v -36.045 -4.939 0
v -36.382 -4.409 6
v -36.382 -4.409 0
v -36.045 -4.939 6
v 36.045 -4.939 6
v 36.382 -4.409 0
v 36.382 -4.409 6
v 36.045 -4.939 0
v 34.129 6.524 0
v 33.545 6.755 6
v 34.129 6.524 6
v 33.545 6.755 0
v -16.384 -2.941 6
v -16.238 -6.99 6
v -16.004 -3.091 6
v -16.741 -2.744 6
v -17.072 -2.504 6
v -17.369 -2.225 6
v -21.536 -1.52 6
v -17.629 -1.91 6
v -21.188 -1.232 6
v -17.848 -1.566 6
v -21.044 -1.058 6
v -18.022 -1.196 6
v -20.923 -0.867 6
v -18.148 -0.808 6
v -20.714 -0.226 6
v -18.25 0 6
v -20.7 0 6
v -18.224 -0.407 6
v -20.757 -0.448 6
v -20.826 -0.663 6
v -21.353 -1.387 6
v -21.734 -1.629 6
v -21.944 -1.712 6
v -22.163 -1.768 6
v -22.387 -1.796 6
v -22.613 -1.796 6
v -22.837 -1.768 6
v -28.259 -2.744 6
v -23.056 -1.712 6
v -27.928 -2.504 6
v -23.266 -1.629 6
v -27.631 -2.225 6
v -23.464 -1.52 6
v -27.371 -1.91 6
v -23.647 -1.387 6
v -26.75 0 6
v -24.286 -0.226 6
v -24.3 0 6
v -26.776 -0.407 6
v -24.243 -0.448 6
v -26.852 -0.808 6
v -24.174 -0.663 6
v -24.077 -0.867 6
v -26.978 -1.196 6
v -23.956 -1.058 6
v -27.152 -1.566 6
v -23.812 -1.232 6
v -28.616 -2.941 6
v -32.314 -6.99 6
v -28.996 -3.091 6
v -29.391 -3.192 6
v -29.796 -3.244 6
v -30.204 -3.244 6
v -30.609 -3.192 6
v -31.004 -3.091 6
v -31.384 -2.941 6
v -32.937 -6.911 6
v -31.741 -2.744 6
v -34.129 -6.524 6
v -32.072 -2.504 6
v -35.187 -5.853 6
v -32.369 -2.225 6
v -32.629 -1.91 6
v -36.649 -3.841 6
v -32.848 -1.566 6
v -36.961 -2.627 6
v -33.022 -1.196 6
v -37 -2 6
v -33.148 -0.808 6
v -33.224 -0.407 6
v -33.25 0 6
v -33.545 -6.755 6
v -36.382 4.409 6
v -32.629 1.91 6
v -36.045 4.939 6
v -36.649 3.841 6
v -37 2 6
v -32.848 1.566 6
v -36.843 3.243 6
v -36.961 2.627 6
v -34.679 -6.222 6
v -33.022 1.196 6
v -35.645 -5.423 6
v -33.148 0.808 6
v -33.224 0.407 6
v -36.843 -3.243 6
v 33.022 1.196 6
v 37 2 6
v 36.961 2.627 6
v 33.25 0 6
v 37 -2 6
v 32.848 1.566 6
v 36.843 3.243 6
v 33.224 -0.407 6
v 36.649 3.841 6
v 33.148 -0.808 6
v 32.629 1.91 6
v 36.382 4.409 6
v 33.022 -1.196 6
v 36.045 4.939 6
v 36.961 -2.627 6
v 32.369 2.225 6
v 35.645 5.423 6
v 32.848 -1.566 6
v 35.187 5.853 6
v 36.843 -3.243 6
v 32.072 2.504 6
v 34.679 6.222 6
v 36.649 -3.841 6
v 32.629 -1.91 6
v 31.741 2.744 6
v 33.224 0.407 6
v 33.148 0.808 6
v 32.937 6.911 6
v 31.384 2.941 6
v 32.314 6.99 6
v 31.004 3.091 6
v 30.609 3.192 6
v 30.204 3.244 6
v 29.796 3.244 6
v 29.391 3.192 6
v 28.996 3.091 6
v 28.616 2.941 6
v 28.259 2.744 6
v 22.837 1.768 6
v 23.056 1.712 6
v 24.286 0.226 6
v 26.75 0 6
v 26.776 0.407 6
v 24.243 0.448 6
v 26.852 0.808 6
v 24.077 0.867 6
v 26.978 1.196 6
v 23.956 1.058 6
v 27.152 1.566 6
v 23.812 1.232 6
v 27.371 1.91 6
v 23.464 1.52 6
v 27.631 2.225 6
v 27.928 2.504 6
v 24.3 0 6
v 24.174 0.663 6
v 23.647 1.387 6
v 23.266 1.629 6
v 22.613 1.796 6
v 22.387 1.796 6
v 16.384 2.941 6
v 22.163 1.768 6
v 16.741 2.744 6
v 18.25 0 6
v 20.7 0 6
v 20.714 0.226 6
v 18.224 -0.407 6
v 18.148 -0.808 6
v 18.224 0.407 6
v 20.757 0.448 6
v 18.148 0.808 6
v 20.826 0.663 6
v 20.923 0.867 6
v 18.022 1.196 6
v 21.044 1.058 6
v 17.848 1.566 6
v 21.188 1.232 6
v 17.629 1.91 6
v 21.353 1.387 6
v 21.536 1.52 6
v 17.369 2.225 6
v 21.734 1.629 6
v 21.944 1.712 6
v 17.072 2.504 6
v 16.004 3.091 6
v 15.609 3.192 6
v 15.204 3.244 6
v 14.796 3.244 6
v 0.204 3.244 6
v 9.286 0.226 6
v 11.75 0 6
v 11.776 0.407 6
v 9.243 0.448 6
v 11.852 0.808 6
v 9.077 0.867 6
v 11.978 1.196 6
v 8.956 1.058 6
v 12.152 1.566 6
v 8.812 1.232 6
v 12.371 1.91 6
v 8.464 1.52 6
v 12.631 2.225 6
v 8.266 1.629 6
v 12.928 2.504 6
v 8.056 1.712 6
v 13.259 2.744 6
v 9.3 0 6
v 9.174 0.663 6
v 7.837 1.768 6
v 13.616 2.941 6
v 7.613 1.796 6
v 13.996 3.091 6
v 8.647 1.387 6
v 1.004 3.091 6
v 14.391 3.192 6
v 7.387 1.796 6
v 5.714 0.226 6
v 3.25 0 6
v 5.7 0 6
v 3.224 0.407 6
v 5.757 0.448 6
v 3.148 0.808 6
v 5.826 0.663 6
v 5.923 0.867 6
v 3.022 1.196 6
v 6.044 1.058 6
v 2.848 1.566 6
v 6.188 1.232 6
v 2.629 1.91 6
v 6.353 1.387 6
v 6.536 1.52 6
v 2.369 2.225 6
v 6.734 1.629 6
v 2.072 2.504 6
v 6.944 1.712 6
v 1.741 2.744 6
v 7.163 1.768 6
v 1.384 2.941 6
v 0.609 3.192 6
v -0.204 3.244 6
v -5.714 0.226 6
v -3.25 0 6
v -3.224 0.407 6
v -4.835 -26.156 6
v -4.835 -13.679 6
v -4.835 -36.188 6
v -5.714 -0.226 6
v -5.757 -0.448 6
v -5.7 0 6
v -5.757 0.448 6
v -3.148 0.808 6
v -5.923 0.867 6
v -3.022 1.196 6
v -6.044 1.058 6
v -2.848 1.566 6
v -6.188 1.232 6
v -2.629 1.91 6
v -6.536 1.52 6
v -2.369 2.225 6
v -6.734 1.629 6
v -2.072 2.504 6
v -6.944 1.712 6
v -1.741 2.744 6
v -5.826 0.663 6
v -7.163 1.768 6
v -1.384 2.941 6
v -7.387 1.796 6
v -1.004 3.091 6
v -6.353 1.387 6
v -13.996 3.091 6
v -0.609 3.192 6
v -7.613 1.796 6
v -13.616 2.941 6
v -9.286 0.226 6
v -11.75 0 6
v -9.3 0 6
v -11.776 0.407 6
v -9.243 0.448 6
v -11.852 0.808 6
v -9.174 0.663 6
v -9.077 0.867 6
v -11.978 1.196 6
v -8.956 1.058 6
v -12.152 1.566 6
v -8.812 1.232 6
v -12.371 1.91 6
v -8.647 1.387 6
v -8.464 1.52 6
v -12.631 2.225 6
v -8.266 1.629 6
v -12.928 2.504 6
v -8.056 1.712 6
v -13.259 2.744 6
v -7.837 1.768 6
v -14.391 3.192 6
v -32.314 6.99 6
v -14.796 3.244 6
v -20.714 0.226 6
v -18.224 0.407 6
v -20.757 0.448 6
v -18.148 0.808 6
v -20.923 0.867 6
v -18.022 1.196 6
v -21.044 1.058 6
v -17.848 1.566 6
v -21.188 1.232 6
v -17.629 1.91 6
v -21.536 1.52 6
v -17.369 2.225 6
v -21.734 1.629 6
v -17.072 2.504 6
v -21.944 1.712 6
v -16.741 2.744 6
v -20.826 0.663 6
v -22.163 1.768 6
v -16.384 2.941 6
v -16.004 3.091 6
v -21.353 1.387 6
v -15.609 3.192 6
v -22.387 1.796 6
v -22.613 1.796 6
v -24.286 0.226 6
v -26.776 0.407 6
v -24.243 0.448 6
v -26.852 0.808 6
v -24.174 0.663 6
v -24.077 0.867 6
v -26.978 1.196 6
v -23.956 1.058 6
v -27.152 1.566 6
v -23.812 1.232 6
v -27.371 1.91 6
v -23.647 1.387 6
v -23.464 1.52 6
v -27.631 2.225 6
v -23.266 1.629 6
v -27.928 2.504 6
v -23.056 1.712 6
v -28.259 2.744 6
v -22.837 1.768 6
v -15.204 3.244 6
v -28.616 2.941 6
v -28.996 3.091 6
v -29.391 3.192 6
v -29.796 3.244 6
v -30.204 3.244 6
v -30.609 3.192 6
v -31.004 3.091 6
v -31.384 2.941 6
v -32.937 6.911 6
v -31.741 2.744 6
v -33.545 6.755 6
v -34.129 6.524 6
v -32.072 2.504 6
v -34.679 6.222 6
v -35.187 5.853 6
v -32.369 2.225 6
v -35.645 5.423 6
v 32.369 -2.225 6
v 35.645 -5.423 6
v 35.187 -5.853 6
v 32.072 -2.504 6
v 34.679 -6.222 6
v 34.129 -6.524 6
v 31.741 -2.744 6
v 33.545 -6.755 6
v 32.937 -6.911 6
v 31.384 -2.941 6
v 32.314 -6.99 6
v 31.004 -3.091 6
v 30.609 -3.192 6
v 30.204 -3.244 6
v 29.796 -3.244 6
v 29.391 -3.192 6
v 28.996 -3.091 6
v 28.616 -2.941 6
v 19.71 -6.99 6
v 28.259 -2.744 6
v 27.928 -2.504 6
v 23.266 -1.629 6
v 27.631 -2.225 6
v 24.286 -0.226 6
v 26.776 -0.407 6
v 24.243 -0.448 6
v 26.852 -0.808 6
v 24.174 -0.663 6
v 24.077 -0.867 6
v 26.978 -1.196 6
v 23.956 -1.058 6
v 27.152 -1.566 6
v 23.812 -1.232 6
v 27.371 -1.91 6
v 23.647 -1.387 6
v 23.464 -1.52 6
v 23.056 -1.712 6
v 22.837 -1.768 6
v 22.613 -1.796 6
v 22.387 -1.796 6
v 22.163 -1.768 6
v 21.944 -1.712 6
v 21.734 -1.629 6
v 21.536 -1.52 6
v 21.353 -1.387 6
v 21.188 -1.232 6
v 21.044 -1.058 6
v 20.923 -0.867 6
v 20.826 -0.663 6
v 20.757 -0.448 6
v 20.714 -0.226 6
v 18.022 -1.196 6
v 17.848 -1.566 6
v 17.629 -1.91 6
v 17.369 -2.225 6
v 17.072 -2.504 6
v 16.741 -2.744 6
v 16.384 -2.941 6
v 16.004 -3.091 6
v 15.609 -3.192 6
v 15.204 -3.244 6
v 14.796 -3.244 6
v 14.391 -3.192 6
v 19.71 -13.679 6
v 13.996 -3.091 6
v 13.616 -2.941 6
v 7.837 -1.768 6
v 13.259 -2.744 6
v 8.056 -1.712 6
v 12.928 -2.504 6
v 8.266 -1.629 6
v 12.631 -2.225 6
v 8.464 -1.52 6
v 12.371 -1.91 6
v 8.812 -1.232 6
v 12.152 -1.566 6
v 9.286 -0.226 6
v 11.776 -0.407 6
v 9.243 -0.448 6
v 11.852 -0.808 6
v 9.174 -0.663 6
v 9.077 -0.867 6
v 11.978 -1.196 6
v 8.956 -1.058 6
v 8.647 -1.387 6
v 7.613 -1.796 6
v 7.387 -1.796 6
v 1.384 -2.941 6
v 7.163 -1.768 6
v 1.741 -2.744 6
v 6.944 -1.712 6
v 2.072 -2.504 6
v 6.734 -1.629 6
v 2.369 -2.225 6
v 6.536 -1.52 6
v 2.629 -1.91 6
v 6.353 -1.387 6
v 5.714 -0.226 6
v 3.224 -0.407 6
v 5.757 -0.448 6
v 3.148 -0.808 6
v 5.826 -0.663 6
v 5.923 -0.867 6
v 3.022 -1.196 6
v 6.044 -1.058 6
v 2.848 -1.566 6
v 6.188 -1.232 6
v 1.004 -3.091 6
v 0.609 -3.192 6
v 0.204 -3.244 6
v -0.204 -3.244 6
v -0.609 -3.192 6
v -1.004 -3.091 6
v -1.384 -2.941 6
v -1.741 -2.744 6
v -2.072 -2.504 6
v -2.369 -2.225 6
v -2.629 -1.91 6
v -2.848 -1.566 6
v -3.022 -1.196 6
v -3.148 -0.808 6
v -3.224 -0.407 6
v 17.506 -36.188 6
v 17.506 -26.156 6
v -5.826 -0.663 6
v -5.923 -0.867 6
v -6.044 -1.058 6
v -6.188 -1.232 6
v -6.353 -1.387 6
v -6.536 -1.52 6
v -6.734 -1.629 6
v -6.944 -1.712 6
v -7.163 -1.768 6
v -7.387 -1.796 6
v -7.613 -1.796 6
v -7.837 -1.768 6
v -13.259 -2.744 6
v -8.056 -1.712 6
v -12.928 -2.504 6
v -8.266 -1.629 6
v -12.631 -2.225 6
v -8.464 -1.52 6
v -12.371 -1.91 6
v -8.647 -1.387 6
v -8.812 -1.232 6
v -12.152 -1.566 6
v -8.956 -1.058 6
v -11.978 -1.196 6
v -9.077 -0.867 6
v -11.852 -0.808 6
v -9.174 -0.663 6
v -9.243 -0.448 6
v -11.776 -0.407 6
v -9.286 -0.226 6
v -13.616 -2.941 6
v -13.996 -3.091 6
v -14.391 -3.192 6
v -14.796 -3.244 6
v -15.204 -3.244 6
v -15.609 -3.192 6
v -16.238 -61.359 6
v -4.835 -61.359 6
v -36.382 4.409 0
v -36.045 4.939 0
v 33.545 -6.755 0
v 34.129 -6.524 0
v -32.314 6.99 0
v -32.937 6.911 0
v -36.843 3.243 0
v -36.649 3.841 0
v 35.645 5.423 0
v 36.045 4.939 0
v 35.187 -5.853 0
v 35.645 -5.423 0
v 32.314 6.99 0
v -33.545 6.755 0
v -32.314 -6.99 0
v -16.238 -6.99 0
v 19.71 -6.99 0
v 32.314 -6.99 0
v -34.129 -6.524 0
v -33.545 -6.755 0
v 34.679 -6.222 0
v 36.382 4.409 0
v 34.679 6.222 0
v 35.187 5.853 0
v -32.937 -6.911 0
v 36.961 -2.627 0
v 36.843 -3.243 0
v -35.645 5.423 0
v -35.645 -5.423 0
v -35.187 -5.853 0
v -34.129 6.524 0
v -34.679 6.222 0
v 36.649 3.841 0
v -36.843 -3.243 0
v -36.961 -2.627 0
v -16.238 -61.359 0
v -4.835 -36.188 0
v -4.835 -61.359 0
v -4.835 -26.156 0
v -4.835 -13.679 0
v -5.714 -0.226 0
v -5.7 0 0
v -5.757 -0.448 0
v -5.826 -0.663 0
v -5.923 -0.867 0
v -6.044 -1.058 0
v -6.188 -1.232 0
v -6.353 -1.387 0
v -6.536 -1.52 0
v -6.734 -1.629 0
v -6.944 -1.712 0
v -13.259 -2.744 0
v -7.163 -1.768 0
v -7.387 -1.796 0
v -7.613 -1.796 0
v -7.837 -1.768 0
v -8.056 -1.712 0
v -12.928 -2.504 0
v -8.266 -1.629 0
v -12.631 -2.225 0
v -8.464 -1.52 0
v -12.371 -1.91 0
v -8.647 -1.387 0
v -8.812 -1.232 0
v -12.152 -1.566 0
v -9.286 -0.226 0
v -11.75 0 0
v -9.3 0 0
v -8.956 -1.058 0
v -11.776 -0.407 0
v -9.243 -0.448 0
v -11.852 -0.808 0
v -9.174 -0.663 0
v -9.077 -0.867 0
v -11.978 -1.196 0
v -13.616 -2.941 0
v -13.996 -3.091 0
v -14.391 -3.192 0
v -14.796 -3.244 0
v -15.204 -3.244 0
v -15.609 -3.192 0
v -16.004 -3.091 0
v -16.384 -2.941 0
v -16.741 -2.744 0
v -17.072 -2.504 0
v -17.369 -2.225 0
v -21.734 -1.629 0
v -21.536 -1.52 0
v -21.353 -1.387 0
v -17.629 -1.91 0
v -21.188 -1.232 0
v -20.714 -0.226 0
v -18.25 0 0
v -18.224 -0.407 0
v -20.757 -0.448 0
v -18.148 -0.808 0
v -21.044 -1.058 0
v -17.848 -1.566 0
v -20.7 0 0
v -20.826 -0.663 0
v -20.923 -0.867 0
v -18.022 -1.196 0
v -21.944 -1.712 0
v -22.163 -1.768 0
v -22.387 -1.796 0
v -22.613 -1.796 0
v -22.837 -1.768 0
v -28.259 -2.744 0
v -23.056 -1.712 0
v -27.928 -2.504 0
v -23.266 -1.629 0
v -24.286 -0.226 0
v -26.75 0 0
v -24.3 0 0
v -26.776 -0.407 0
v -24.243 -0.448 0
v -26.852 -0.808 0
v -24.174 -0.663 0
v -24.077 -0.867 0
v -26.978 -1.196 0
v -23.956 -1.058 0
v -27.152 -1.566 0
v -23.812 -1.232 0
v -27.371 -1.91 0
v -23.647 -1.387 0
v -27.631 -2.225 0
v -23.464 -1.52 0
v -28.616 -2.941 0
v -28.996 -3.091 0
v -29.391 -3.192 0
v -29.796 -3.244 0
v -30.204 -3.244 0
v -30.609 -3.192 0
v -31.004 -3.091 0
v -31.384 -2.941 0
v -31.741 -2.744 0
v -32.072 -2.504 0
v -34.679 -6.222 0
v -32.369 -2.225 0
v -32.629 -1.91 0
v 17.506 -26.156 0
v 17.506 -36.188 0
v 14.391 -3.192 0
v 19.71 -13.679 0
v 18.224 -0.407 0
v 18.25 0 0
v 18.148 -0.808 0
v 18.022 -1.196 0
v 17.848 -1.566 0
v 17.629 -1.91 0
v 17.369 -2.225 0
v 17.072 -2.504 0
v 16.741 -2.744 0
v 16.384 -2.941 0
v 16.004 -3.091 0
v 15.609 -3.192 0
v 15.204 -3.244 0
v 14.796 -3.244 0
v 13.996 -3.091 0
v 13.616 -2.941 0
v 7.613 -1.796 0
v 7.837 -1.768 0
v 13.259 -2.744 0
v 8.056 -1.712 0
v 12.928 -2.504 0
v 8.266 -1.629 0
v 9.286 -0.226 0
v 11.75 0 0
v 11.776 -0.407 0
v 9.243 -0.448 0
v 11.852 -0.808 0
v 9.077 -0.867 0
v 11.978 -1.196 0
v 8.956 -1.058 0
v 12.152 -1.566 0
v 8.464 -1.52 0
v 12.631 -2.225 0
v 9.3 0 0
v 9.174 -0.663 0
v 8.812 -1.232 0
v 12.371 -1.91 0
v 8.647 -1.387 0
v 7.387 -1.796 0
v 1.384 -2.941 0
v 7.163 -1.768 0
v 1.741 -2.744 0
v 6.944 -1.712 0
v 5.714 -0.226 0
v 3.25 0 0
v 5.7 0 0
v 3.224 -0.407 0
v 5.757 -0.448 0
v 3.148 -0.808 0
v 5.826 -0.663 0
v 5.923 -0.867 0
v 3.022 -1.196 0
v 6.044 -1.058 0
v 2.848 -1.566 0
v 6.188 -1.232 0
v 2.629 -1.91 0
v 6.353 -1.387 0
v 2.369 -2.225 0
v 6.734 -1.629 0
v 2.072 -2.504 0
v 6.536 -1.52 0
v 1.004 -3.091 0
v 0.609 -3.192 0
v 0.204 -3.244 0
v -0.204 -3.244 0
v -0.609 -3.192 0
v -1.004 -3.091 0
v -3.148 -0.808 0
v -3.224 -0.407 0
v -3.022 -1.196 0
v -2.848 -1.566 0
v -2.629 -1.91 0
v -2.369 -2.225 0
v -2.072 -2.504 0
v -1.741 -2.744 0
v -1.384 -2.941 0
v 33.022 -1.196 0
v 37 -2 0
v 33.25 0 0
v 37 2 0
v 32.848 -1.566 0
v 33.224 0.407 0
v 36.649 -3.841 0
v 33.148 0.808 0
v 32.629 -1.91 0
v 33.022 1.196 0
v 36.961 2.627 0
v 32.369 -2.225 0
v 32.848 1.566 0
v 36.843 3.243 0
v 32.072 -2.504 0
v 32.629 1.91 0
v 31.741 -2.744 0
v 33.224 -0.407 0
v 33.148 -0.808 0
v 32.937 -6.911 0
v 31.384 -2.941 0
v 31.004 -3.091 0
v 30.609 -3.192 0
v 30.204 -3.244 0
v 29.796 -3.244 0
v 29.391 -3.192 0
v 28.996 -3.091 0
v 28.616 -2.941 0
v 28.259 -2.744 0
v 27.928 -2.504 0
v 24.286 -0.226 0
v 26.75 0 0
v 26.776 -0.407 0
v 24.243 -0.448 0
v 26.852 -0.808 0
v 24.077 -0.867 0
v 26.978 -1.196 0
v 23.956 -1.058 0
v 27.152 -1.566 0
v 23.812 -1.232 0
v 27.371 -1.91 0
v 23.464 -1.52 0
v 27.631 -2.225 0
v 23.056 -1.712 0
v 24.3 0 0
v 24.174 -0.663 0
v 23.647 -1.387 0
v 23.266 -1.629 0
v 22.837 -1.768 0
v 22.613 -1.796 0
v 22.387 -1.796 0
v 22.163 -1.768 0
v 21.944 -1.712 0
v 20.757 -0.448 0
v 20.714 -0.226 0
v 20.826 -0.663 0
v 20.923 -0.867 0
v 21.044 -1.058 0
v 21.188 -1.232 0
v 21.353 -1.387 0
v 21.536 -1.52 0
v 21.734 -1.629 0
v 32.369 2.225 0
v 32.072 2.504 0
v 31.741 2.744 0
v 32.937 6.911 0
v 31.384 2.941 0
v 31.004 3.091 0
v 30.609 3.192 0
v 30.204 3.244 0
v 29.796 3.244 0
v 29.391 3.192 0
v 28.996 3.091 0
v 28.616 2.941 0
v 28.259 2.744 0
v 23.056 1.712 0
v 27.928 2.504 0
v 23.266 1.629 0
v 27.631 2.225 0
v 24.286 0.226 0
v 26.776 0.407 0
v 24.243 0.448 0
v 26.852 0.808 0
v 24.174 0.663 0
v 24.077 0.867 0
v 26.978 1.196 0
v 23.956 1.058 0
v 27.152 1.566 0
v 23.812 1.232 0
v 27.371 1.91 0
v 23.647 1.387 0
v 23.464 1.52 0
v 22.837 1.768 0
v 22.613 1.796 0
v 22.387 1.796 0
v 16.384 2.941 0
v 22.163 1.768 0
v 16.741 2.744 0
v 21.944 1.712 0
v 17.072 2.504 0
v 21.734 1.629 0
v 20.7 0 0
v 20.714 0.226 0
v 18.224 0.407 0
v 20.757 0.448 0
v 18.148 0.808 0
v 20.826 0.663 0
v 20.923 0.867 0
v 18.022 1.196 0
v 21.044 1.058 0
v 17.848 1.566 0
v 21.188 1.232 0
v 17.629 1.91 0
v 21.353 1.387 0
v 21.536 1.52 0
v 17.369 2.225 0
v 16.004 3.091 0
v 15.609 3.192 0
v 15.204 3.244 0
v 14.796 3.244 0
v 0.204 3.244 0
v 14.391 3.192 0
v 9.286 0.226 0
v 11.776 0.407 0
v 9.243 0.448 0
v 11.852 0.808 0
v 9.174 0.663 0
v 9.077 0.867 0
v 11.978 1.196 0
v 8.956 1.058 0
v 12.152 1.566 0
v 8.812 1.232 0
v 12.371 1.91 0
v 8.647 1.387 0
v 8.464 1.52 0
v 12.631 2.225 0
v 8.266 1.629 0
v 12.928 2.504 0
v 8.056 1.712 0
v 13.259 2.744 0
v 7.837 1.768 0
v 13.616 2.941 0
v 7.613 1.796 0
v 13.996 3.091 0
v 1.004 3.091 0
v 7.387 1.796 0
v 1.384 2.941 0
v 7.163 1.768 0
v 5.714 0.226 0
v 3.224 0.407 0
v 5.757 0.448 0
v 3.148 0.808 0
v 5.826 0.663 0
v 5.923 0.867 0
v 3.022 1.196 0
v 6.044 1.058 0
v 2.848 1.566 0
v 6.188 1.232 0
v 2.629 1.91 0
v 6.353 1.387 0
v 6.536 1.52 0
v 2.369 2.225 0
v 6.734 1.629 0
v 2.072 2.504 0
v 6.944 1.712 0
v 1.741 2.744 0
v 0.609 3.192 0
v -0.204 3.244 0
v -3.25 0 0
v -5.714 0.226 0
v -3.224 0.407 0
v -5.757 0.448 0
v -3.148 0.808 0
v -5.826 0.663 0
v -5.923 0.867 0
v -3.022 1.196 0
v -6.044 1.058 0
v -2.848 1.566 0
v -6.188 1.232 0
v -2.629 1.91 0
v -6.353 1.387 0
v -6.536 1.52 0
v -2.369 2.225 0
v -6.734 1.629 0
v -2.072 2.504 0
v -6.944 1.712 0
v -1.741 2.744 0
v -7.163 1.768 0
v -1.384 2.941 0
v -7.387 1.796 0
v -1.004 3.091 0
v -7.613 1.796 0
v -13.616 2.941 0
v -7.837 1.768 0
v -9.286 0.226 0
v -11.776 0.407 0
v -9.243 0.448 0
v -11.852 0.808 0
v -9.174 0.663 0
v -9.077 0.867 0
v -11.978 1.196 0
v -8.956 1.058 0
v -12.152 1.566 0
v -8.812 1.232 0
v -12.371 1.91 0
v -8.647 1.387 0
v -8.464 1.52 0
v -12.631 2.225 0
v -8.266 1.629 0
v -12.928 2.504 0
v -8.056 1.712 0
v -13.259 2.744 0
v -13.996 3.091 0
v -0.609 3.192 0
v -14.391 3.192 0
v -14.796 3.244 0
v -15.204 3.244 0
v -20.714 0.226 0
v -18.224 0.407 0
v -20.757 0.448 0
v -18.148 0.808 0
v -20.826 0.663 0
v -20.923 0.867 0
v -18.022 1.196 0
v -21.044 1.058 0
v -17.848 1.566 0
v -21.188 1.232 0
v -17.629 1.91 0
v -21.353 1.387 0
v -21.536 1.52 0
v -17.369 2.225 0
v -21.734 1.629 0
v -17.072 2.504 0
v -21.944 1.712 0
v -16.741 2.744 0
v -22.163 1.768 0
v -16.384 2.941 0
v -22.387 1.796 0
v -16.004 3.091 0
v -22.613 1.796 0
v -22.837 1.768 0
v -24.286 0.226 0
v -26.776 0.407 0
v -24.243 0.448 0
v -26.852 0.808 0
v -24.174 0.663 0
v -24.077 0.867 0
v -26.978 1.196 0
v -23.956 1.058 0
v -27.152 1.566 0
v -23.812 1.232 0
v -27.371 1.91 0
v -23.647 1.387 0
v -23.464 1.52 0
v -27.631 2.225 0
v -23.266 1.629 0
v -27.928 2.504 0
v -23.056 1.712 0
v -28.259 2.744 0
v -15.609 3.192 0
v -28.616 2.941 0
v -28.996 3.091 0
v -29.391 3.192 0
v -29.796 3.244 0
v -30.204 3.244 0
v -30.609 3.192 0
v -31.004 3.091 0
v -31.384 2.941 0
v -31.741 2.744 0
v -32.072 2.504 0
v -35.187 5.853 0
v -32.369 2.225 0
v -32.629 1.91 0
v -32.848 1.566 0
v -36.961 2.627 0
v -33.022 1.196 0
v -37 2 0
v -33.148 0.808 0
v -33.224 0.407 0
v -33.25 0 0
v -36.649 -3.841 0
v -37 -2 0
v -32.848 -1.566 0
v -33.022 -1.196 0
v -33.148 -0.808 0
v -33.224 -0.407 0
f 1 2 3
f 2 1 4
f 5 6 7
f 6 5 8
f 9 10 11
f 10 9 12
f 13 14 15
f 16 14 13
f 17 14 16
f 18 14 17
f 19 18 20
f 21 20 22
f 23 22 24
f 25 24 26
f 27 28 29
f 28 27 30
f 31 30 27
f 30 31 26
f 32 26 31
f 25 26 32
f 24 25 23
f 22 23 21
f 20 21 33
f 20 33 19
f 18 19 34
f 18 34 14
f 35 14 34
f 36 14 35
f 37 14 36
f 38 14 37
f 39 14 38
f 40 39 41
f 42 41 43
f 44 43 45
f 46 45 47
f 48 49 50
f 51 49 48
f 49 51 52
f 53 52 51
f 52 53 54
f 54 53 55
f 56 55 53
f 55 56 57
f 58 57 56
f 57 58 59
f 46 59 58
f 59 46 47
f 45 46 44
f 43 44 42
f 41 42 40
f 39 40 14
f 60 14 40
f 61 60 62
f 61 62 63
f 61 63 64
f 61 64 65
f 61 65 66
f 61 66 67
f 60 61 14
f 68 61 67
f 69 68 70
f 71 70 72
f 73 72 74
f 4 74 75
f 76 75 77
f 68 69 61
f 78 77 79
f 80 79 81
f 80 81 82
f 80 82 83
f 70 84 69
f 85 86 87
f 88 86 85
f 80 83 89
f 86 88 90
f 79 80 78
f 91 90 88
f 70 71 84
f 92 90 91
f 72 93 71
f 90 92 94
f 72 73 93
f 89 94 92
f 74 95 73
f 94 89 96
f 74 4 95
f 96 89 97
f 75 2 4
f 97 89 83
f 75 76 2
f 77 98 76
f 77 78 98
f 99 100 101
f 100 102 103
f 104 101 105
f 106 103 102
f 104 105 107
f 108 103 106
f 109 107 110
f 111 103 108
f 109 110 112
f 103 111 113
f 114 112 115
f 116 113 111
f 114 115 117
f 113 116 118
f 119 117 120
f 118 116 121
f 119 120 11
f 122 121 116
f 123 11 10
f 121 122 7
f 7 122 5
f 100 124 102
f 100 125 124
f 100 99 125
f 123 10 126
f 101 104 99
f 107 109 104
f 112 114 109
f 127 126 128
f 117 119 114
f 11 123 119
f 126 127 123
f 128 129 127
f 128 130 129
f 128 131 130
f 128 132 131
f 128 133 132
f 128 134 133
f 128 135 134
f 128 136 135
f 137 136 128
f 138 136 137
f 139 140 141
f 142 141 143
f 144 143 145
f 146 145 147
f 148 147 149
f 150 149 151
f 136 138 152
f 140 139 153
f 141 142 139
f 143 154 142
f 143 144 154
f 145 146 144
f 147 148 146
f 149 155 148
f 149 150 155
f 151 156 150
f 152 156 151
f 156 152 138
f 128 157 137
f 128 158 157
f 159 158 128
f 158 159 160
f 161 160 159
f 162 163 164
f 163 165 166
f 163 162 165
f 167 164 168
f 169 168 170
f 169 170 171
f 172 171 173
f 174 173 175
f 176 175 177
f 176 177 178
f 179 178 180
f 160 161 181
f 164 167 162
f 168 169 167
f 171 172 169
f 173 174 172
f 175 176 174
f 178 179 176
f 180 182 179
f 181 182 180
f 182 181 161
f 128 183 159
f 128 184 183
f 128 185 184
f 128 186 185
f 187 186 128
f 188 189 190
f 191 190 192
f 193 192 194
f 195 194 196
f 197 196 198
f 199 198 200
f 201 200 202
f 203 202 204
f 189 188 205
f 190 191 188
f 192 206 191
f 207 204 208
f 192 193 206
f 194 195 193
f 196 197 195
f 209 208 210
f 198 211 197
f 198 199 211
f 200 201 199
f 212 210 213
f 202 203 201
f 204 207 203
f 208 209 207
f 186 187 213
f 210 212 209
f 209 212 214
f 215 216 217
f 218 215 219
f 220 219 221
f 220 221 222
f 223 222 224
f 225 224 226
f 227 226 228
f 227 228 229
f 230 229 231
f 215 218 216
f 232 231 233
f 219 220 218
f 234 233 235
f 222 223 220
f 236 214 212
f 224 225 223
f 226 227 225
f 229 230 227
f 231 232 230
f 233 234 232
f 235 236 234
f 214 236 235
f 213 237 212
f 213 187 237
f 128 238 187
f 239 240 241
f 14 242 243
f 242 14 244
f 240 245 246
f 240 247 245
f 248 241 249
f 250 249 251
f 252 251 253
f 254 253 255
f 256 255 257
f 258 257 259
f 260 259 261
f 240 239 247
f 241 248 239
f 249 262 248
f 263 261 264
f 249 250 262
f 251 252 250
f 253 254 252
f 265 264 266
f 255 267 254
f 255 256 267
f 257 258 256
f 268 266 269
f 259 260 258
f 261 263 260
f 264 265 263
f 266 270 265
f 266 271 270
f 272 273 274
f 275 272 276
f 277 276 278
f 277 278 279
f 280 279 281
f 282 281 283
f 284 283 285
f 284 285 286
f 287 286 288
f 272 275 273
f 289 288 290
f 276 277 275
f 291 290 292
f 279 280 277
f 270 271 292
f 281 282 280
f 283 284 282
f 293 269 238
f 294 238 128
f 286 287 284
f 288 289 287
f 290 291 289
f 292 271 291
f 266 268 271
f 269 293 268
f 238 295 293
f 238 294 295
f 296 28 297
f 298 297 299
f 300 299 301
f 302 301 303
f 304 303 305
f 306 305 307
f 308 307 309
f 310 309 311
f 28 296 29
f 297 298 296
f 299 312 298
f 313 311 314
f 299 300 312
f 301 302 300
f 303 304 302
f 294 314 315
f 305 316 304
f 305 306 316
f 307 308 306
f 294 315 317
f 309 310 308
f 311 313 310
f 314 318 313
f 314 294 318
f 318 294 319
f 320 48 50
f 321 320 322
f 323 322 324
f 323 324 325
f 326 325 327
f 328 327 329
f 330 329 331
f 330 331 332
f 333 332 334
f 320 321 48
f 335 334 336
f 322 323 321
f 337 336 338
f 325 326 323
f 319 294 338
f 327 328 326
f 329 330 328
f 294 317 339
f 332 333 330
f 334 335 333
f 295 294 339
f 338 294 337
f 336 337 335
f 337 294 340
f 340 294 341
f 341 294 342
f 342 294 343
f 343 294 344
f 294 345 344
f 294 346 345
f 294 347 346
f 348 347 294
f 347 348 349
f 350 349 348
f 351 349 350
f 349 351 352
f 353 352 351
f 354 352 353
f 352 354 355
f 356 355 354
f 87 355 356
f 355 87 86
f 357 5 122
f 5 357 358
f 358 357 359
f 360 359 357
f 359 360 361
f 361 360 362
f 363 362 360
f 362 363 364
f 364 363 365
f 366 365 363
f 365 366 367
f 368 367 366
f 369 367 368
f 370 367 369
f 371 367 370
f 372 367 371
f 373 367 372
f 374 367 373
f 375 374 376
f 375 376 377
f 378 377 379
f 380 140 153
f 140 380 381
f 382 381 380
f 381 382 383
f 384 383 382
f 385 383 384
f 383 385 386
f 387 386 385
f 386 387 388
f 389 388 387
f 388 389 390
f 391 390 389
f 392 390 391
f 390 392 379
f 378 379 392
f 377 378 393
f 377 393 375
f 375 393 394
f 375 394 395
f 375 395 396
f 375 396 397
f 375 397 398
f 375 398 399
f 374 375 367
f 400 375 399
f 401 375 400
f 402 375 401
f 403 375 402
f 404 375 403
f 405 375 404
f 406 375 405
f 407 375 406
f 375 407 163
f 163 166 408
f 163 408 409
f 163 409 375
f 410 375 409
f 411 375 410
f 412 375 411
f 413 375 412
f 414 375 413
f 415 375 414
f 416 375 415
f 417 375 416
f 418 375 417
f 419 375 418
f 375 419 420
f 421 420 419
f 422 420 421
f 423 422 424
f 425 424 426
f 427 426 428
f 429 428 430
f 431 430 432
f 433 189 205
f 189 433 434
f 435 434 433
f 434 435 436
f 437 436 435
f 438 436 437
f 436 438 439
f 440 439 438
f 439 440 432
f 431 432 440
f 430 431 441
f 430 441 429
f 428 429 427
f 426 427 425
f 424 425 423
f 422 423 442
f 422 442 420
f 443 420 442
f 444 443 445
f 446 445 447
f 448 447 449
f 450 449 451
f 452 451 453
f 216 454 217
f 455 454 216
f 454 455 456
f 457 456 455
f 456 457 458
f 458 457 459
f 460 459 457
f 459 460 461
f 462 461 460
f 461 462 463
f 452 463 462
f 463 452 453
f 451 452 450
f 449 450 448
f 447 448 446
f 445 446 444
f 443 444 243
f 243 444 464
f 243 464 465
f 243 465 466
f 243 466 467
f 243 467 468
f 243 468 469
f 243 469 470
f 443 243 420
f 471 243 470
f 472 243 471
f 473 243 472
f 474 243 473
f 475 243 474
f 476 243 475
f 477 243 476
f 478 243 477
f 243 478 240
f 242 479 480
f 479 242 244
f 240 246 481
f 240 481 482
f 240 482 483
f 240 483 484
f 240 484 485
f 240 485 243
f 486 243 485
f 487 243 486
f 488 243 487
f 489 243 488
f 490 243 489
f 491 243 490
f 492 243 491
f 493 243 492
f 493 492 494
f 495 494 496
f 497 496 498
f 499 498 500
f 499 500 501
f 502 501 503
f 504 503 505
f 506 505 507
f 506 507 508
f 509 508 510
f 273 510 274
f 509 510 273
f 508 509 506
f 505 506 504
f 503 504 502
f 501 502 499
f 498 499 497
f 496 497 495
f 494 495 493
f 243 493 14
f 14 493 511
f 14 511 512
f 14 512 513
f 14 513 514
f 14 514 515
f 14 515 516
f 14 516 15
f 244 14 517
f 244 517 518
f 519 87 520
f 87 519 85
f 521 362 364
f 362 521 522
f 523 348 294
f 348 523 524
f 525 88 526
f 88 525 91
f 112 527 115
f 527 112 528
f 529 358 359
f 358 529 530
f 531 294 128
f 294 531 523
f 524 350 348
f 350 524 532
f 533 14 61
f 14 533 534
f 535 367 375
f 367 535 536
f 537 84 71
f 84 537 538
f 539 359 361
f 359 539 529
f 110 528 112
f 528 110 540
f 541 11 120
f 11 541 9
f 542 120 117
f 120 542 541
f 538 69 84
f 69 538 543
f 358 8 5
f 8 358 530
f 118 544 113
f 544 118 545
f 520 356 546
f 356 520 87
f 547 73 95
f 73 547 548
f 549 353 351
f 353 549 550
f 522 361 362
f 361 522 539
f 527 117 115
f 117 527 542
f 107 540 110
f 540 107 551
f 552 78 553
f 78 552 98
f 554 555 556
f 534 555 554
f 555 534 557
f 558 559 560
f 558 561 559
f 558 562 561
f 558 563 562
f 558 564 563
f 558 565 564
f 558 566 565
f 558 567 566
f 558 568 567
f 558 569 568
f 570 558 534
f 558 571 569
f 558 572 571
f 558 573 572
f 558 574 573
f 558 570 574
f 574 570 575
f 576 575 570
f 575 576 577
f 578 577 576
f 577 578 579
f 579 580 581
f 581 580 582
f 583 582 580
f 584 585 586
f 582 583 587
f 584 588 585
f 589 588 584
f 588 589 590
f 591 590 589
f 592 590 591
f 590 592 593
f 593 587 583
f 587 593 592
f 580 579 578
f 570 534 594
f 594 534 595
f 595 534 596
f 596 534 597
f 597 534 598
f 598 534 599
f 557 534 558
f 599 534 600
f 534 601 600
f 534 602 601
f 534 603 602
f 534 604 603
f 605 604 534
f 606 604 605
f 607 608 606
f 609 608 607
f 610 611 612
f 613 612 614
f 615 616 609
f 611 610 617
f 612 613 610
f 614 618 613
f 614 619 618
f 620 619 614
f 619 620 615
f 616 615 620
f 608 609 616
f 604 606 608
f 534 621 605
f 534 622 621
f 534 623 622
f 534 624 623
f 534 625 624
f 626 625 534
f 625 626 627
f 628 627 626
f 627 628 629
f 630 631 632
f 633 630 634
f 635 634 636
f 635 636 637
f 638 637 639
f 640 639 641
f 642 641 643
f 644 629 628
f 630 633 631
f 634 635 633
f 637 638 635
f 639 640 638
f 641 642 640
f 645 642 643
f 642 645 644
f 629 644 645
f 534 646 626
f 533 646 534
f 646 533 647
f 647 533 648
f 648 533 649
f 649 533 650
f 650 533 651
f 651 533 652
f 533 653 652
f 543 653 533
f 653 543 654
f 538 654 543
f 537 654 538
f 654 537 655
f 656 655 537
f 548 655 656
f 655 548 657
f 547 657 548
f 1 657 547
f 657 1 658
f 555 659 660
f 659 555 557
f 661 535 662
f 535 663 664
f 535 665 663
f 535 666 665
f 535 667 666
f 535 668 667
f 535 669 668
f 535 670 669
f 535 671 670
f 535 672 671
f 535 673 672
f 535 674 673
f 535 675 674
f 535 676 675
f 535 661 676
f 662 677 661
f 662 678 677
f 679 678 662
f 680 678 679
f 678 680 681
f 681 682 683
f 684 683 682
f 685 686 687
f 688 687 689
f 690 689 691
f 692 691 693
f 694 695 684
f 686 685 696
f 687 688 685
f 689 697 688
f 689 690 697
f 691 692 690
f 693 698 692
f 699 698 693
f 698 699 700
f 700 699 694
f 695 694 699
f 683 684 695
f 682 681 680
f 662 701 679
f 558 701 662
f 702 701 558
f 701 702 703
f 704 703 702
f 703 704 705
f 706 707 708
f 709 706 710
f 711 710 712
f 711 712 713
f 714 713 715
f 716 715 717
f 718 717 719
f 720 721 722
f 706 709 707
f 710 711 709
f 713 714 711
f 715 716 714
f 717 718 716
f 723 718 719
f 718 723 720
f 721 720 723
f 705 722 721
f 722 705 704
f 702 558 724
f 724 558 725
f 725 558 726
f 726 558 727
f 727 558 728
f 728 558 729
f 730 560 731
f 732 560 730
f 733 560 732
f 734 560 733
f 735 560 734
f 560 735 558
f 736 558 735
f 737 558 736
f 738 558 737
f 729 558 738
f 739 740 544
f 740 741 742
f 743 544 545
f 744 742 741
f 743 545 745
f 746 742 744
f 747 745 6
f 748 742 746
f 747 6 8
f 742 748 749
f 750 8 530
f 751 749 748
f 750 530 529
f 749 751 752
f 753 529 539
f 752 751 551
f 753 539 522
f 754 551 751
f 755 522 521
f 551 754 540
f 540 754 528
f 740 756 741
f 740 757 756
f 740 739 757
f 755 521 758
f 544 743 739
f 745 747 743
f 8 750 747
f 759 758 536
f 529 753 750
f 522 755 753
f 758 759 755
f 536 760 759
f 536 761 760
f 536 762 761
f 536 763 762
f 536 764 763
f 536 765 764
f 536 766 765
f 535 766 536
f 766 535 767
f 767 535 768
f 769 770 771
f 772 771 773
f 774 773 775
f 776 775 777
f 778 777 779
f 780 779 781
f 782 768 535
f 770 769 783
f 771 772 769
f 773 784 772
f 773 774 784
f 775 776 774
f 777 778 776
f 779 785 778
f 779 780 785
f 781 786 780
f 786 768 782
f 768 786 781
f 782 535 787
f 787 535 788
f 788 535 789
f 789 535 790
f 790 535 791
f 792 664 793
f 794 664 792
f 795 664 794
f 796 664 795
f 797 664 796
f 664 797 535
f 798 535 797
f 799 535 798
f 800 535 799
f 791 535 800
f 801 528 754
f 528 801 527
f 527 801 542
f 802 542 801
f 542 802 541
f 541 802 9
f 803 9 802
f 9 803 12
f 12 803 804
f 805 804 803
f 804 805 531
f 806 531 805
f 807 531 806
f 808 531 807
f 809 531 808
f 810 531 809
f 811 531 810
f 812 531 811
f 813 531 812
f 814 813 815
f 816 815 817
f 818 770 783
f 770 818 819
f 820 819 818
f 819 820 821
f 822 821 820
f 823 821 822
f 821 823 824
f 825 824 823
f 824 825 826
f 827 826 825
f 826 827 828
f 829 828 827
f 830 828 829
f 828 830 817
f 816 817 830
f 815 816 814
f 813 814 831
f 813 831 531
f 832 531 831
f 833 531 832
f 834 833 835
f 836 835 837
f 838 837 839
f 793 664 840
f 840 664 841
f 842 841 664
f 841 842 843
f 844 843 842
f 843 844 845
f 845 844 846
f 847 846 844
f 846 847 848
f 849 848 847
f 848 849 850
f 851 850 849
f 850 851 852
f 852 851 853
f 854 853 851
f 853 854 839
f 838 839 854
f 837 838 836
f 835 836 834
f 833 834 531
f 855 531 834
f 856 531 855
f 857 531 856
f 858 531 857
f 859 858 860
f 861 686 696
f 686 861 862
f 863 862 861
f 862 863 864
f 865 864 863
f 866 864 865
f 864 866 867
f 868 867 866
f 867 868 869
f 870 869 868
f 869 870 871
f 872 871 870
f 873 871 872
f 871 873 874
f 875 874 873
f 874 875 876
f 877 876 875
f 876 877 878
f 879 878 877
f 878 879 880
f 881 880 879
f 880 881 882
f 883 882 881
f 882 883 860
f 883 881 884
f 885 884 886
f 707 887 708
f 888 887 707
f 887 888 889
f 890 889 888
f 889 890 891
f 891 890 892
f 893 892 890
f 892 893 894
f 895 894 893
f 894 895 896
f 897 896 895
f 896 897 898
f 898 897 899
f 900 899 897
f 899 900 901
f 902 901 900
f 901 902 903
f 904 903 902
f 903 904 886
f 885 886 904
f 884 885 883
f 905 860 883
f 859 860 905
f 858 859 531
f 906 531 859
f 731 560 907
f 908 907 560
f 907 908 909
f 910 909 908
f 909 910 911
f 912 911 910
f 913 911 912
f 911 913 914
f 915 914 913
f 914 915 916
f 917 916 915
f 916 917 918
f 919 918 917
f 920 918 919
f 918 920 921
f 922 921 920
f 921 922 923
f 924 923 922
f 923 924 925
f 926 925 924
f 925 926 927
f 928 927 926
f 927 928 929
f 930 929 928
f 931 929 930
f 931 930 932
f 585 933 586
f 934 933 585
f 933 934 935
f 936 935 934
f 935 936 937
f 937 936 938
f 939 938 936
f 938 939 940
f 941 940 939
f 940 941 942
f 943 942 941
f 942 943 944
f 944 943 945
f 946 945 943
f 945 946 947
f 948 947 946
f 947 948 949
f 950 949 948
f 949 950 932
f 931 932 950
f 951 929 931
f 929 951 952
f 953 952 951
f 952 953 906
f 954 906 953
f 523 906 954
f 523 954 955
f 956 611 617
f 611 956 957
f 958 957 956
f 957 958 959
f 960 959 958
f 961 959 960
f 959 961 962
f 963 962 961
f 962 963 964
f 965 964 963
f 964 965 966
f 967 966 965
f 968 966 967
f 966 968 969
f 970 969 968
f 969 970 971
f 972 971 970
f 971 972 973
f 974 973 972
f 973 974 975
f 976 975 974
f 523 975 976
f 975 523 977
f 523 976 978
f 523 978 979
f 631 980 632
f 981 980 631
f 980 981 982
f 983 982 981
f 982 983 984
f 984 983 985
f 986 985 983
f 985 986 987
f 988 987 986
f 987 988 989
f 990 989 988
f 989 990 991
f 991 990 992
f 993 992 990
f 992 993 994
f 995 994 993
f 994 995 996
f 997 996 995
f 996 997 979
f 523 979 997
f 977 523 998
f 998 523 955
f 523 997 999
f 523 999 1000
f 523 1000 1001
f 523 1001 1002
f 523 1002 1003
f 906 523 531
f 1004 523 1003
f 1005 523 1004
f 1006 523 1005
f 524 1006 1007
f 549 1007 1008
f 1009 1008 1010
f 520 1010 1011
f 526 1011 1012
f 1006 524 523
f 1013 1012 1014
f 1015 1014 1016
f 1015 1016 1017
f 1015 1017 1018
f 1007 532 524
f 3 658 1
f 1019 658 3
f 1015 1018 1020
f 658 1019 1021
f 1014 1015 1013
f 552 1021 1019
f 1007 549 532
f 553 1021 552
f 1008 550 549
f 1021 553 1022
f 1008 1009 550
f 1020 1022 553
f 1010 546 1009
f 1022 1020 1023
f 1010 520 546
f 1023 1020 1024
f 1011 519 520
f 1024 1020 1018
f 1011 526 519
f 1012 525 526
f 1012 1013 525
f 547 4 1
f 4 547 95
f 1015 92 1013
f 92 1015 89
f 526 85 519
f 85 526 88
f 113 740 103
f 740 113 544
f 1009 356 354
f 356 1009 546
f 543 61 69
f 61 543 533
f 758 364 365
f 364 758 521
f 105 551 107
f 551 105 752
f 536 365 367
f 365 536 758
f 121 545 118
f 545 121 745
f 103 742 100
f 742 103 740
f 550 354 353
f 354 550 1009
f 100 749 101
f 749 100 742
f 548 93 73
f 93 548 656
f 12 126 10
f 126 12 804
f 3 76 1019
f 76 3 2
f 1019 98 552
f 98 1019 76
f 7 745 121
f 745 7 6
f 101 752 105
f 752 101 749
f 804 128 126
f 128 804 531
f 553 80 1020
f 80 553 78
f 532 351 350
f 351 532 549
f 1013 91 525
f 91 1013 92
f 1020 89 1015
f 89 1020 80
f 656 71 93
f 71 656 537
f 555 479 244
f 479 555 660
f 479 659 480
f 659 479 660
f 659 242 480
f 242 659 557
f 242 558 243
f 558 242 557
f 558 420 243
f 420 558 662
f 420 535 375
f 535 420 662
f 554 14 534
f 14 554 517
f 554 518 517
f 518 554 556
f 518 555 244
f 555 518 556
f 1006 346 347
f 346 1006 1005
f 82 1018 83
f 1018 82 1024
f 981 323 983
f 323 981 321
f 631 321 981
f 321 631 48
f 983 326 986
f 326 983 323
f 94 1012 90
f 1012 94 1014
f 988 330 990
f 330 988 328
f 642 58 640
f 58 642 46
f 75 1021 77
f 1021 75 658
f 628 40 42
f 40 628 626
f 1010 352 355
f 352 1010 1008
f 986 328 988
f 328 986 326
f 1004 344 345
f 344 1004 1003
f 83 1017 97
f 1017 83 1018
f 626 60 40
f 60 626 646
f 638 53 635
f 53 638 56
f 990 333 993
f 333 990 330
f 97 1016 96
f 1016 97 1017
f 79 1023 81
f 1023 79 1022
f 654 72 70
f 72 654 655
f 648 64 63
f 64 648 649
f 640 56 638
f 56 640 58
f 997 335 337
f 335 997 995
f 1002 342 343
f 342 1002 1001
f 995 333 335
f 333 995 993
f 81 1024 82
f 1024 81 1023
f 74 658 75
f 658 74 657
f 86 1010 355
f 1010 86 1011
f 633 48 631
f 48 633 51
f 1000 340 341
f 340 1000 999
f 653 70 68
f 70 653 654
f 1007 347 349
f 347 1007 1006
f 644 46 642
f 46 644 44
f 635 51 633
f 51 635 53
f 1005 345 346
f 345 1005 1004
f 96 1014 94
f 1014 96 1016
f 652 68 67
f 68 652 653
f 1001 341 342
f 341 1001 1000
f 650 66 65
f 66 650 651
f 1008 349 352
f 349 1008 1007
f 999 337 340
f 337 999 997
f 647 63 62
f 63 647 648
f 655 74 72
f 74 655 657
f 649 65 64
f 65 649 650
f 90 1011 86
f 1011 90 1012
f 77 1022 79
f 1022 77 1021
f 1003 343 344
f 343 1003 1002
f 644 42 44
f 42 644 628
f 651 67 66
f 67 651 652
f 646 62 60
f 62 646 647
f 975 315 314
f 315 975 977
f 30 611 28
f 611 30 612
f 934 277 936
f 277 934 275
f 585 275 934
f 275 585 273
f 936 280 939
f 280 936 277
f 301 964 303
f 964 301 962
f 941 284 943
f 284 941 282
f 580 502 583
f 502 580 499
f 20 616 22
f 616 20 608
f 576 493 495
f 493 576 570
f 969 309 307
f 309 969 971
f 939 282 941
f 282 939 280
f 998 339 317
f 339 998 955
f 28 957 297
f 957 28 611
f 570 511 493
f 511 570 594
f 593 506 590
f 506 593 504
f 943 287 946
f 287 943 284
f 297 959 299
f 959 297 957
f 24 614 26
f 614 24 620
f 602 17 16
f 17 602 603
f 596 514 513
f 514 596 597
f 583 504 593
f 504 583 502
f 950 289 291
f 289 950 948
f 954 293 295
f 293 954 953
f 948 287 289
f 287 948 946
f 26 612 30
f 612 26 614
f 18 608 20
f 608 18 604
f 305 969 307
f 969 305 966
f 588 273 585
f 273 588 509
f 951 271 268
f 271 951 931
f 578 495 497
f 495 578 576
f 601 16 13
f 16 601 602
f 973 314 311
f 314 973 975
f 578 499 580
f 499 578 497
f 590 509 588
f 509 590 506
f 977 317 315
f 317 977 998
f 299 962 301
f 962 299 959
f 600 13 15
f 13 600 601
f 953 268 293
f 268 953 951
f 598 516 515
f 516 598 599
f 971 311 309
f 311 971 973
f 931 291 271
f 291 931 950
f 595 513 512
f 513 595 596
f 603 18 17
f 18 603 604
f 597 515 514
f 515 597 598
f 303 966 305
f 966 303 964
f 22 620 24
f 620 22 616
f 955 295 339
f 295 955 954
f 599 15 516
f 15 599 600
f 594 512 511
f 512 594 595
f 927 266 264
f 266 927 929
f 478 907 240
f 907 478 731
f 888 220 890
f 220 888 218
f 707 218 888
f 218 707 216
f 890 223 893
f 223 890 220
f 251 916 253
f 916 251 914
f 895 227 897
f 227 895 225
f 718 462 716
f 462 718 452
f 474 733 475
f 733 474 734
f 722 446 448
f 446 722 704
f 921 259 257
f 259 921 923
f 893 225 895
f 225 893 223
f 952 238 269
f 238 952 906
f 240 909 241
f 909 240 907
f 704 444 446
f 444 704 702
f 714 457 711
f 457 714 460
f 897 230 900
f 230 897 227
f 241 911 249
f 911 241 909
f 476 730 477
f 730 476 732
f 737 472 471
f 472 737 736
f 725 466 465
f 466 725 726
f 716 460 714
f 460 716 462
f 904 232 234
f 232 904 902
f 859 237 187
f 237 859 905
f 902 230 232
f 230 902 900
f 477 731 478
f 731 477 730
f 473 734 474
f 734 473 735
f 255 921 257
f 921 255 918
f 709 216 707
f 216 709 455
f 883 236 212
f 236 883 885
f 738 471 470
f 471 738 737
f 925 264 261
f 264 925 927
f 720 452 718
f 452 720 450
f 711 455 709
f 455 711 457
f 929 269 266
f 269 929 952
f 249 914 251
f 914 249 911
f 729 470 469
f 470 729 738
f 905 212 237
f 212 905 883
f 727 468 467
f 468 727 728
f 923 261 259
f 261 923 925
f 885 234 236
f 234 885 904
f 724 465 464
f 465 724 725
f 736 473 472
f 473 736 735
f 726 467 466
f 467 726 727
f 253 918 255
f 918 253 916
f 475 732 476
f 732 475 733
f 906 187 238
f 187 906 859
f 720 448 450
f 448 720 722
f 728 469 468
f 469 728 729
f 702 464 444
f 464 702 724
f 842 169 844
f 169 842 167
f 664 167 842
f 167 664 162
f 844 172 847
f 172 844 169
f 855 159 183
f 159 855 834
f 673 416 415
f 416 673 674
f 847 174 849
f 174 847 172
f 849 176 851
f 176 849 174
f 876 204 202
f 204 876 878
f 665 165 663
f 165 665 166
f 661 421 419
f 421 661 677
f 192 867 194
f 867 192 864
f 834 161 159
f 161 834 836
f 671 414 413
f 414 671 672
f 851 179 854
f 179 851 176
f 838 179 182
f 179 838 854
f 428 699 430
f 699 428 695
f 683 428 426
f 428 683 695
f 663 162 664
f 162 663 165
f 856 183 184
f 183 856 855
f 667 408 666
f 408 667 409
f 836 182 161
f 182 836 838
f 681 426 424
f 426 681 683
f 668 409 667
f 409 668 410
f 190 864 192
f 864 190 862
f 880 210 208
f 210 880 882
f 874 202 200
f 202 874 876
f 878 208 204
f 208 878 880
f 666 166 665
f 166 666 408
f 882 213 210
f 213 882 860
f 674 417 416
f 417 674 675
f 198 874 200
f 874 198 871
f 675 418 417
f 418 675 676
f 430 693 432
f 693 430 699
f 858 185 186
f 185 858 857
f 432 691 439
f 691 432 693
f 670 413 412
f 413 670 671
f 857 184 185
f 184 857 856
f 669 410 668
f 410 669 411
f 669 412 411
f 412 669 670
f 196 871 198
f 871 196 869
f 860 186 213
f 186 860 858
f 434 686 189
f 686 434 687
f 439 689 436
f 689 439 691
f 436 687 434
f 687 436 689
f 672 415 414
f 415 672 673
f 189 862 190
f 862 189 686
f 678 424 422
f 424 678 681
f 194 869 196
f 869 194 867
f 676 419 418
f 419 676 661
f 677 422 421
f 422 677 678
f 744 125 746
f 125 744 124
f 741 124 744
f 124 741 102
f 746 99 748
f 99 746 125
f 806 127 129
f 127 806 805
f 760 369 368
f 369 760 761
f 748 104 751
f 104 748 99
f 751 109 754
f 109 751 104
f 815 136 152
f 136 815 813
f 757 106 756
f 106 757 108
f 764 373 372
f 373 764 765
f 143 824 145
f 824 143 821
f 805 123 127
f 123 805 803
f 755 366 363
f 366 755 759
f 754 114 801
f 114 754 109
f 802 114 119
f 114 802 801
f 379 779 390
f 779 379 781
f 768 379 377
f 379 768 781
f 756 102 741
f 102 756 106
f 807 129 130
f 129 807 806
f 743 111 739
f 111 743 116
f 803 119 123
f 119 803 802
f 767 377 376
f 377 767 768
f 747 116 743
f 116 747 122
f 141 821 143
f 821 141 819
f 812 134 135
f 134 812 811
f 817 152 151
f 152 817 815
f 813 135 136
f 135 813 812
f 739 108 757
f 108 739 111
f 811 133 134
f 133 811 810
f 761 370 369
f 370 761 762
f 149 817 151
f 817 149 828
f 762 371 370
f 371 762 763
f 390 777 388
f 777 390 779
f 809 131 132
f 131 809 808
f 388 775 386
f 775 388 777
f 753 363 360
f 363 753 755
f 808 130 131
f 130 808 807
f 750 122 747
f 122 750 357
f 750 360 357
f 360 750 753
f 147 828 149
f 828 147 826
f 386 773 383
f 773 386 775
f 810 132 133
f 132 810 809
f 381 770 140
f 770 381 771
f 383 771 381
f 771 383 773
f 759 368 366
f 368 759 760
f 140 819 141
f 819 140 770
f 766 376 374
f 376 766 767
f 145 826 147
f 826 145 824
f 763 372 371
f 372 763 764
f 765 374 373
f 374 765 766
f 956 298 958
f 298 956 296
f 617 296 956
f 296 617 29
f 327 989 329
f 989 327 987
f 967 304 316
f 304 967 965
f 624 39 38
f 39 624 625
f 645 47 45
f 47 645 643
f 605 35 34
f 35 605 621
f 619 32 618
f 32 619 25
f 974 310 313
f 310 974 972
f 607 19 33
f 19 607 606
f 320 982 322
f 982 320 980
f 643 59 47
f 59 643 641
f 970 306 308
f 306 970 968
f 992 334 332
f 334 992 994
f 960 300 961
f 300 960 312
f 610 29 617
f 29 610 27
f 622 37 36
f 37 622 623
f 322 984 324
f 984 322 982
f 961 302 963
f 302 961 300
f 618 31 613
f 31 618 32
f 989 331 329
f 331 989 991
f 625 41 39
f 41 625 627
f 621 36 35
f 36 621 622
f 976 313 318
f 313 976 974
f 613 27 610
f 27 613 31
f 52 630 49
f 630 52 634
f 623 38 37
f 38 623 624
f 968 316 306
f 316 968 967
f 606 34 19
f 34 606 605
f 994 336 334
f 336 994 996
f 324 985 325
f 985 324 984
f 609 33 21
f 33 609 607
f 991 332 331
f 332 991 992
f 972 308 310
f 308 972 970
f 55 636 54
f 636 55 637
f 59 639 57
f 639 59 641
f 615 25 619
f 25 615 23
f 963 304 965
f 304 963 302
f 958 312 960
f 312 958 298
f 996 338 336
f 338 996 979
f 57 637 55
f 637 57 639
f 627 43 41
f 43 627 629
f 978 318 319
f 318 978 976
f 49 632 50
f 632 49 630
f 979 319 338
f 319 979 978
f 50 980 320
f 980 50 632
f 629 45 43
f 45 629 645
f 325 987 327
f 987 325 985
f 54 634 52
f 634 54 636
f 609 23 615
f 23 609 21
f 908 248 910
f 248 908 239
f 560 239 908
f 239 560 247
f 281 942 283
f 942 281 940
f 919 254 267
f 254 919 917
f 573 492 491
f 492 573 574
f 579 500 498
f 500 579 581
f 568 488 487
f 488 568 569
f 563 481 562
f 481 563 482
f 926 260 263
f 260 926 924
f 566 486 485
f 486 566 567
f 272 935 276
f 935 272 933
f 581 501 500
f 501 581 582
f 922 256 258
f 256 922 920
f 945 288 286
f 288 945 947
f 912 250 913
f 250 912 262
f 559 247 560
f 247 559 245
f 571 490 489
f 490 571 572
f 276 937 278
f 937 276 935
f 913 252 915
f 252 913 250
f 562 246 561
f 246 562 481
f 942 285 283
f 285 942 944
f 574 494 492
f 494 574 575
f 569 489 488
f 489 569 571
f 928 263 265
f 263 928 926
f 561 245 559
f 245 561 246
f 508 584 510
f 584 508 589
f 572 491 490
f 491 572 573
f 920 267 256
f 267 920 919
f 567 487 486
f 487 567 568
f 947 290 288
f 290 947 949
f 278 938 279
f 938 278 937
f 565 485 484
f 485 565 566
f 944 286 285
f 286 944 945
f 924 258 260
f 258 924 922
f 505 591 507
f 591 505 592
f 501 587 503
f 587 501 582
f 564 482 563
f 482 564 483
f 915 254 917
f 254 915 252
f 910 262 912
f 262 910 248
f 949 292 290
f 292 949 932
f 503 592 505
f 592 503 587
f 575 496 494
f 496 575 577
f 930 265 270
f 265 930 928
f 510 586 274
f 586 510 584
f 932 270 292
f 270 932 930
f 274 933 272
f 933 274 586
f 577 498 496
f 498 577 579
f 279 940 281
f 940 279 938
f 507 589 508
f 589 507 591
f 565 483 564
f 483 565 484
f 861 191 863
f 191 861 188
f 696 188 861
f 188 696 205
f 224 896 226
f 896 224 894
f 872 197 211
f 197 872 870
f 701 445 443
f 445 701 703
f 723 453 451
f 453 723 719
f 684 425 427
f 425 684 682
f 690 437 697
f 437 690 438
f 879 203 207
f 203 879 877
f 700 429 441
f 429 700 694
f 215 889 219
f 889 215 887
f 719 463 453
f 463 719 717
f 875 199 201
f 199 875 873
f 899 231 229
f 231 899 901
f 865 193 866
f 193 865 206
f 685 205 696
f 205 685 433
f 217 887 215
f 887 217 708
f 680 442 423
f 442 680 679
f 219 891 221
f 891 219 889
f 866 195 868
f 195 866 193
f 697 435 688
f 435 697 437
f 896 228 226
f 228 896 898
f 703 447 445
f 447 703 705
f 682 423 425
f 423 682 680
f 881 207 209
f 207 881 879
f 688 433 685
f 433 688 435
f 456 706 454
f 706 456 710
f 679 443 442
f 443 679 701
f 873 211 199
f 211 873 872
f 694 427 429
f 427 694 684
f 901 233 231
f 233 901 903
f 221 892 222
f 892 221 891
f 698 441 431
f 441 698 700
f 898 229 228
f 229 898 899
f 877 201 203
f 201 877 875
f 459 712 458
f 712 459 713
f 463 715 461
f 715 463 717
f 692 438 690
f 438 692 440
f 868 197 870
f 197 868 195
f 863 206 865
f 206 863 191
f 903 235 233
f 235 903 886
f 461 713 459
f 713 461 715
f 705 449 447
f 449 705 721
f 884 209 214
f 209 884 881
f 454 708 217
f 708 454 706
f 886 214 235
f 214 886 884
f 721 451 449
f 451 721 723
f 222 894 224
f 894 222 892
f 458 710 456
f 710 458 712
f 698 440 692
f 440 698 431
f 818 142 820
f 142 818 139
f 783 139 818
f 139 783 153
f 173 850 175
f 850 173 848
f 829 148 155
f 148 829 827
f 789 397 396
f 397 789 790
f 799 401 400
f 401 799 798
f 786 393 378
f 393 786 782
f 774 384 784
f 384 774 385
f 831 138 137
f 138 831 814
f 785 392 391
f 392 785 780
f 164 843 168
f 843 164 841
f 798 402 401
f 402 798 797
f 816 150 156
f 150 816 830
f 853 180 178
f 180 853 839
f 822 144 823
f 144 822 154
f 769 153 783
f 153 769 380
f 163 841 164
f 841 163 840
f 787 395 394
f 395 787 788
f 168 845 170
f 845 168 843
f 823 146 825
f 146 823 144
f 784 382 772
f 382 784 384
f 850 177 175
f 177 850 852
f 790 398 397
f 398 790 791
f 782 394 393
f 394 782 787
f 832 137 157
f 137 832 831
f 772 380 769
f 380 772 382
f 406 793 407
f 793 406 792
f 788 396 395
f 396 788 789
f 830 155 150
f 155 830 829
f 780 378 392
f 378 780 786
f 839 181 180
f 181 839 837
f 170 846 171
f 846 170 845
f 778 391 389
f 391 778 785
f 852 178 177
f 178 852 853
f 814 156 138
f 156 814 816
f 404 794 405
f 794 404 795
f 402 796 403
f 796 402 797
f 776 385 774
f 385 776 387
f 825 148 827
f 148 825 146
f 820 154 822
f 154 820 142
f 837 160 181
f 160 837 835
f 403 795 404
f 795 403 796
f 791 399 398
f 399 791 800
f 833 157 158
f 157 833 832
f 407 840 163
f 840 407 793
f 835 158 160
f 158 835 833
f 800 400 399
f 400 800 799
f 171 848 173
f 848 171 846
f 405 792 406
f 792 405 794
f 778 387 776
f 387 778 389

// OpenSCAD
$fn = 50;


difference() {
	union() {
		hull() {
			translate(v = [-32.0000000000, 2.0000000000, 0]) {
				cylinder(h = 6, r = 5);
			}
			translate(v = [32.0000000000, 2.0000000000, 0]) {
				cylinder(h = 6, r = 5);
			}
			translate(v = [-32.0000000000, -2.0000000000, 0]) {
				cylinder(h = 6, r = 5);
			}
			translate(v = [32.0000000000, -2.0000000000, 0]) {
				cylinder(h = 6, r = 5);
			}
		}
		translate(v = [0, -5, 0]) {
			linear_extrude(height = 6) {
				text(font = "DejaVu Sans Mono:style=Bold", halign = "center", size = 57.0000000000, text = "F", valign = "top");
			}
		}
	}
	union() {
		translate(v = [-30.0000000000, 0.0000000000, 0]) {
			translate(v = [0, 0, -100]) {
				cylinder(h = 200, r = 3.2500000000);
			}
		}
		translate(v = [-15.0000000000, 0.0000000000, 0]) {
			translate(v = [0, 0, -100]) {
				cylinder(h = 200, r = 3.2500000000);
			}
		}
		translate(v = [0, 0, -100]) {
			cylinder(h = 200, r = 3.2500000000);
		}
		translate(v = [15.0000000000, 0.0000000000, 0]) {
			translate(v = [0, 0, -100]) {
				cylinder(h = 200, r = 3.2500000000);
			}
		}
		translate(v = [30.0000000000, 0.0000000000, 0]) {
			translate(v = [0, 0, -100]) {
				cylinder(h = 200, r = 3.2500000000);
			}
		}
		translate(v = [-30.0000000000, 0.0000000000, 0]) {
			translate(v = [0, 0, -100]) {
				cylinder(h = 200, r = 1.8000000000);
			}
		}
		translate(v = [-22.5000000000, 0.0000000000, 0]) {
			translate(v = [0, 0, -100]) {
				cylinder(h = 200, r = 1.8000000000);
			}
		}
		translate(v = [-15.0000000000, 0.0000000000, 0]) {
			translate(v = [0, 0, -100]) {
				cylinder(h = 200, r = 1.8000000000);
			}
		}
		translate(v = [-7.5000000000, 0.0000000000, 0]) {
			translate(v = [0, 0, -100]) {
				cylinder(h = 200, r = 1.8000000000);
			}
		}
		translate(v = [0, 0, -100]) {
			cylinder(h = 200, r = 1.8000000000);
		}
		translate(v = [7.5000000000, 0.0000000000, 0]) {
			translate(v = [0, 0, -100]) {
				cylinder(h = 200, r = 1.8000000000);
			}
		}
		translate(v = [15.0000000000, 0.0000000000, 0]) {
			translate(v = [0, 0, -100]) {
				cylinder(h = 200, r = 1.8000000000);
			}
		}
		translate(v = [22.5000000000, 0.0000000000, 0]) {
			translate(v = [0, 0, -100]) {
				cylinder(h = 200, r = 1.8000000000);
			}
		}
		translate(v = [30.0000000000, 0.0000000000, 0]) {
			translate(v = [0, 0, -100]) {
				cylinder(h = 200, r = 1.8000000000);
			}
		}
	}
}
